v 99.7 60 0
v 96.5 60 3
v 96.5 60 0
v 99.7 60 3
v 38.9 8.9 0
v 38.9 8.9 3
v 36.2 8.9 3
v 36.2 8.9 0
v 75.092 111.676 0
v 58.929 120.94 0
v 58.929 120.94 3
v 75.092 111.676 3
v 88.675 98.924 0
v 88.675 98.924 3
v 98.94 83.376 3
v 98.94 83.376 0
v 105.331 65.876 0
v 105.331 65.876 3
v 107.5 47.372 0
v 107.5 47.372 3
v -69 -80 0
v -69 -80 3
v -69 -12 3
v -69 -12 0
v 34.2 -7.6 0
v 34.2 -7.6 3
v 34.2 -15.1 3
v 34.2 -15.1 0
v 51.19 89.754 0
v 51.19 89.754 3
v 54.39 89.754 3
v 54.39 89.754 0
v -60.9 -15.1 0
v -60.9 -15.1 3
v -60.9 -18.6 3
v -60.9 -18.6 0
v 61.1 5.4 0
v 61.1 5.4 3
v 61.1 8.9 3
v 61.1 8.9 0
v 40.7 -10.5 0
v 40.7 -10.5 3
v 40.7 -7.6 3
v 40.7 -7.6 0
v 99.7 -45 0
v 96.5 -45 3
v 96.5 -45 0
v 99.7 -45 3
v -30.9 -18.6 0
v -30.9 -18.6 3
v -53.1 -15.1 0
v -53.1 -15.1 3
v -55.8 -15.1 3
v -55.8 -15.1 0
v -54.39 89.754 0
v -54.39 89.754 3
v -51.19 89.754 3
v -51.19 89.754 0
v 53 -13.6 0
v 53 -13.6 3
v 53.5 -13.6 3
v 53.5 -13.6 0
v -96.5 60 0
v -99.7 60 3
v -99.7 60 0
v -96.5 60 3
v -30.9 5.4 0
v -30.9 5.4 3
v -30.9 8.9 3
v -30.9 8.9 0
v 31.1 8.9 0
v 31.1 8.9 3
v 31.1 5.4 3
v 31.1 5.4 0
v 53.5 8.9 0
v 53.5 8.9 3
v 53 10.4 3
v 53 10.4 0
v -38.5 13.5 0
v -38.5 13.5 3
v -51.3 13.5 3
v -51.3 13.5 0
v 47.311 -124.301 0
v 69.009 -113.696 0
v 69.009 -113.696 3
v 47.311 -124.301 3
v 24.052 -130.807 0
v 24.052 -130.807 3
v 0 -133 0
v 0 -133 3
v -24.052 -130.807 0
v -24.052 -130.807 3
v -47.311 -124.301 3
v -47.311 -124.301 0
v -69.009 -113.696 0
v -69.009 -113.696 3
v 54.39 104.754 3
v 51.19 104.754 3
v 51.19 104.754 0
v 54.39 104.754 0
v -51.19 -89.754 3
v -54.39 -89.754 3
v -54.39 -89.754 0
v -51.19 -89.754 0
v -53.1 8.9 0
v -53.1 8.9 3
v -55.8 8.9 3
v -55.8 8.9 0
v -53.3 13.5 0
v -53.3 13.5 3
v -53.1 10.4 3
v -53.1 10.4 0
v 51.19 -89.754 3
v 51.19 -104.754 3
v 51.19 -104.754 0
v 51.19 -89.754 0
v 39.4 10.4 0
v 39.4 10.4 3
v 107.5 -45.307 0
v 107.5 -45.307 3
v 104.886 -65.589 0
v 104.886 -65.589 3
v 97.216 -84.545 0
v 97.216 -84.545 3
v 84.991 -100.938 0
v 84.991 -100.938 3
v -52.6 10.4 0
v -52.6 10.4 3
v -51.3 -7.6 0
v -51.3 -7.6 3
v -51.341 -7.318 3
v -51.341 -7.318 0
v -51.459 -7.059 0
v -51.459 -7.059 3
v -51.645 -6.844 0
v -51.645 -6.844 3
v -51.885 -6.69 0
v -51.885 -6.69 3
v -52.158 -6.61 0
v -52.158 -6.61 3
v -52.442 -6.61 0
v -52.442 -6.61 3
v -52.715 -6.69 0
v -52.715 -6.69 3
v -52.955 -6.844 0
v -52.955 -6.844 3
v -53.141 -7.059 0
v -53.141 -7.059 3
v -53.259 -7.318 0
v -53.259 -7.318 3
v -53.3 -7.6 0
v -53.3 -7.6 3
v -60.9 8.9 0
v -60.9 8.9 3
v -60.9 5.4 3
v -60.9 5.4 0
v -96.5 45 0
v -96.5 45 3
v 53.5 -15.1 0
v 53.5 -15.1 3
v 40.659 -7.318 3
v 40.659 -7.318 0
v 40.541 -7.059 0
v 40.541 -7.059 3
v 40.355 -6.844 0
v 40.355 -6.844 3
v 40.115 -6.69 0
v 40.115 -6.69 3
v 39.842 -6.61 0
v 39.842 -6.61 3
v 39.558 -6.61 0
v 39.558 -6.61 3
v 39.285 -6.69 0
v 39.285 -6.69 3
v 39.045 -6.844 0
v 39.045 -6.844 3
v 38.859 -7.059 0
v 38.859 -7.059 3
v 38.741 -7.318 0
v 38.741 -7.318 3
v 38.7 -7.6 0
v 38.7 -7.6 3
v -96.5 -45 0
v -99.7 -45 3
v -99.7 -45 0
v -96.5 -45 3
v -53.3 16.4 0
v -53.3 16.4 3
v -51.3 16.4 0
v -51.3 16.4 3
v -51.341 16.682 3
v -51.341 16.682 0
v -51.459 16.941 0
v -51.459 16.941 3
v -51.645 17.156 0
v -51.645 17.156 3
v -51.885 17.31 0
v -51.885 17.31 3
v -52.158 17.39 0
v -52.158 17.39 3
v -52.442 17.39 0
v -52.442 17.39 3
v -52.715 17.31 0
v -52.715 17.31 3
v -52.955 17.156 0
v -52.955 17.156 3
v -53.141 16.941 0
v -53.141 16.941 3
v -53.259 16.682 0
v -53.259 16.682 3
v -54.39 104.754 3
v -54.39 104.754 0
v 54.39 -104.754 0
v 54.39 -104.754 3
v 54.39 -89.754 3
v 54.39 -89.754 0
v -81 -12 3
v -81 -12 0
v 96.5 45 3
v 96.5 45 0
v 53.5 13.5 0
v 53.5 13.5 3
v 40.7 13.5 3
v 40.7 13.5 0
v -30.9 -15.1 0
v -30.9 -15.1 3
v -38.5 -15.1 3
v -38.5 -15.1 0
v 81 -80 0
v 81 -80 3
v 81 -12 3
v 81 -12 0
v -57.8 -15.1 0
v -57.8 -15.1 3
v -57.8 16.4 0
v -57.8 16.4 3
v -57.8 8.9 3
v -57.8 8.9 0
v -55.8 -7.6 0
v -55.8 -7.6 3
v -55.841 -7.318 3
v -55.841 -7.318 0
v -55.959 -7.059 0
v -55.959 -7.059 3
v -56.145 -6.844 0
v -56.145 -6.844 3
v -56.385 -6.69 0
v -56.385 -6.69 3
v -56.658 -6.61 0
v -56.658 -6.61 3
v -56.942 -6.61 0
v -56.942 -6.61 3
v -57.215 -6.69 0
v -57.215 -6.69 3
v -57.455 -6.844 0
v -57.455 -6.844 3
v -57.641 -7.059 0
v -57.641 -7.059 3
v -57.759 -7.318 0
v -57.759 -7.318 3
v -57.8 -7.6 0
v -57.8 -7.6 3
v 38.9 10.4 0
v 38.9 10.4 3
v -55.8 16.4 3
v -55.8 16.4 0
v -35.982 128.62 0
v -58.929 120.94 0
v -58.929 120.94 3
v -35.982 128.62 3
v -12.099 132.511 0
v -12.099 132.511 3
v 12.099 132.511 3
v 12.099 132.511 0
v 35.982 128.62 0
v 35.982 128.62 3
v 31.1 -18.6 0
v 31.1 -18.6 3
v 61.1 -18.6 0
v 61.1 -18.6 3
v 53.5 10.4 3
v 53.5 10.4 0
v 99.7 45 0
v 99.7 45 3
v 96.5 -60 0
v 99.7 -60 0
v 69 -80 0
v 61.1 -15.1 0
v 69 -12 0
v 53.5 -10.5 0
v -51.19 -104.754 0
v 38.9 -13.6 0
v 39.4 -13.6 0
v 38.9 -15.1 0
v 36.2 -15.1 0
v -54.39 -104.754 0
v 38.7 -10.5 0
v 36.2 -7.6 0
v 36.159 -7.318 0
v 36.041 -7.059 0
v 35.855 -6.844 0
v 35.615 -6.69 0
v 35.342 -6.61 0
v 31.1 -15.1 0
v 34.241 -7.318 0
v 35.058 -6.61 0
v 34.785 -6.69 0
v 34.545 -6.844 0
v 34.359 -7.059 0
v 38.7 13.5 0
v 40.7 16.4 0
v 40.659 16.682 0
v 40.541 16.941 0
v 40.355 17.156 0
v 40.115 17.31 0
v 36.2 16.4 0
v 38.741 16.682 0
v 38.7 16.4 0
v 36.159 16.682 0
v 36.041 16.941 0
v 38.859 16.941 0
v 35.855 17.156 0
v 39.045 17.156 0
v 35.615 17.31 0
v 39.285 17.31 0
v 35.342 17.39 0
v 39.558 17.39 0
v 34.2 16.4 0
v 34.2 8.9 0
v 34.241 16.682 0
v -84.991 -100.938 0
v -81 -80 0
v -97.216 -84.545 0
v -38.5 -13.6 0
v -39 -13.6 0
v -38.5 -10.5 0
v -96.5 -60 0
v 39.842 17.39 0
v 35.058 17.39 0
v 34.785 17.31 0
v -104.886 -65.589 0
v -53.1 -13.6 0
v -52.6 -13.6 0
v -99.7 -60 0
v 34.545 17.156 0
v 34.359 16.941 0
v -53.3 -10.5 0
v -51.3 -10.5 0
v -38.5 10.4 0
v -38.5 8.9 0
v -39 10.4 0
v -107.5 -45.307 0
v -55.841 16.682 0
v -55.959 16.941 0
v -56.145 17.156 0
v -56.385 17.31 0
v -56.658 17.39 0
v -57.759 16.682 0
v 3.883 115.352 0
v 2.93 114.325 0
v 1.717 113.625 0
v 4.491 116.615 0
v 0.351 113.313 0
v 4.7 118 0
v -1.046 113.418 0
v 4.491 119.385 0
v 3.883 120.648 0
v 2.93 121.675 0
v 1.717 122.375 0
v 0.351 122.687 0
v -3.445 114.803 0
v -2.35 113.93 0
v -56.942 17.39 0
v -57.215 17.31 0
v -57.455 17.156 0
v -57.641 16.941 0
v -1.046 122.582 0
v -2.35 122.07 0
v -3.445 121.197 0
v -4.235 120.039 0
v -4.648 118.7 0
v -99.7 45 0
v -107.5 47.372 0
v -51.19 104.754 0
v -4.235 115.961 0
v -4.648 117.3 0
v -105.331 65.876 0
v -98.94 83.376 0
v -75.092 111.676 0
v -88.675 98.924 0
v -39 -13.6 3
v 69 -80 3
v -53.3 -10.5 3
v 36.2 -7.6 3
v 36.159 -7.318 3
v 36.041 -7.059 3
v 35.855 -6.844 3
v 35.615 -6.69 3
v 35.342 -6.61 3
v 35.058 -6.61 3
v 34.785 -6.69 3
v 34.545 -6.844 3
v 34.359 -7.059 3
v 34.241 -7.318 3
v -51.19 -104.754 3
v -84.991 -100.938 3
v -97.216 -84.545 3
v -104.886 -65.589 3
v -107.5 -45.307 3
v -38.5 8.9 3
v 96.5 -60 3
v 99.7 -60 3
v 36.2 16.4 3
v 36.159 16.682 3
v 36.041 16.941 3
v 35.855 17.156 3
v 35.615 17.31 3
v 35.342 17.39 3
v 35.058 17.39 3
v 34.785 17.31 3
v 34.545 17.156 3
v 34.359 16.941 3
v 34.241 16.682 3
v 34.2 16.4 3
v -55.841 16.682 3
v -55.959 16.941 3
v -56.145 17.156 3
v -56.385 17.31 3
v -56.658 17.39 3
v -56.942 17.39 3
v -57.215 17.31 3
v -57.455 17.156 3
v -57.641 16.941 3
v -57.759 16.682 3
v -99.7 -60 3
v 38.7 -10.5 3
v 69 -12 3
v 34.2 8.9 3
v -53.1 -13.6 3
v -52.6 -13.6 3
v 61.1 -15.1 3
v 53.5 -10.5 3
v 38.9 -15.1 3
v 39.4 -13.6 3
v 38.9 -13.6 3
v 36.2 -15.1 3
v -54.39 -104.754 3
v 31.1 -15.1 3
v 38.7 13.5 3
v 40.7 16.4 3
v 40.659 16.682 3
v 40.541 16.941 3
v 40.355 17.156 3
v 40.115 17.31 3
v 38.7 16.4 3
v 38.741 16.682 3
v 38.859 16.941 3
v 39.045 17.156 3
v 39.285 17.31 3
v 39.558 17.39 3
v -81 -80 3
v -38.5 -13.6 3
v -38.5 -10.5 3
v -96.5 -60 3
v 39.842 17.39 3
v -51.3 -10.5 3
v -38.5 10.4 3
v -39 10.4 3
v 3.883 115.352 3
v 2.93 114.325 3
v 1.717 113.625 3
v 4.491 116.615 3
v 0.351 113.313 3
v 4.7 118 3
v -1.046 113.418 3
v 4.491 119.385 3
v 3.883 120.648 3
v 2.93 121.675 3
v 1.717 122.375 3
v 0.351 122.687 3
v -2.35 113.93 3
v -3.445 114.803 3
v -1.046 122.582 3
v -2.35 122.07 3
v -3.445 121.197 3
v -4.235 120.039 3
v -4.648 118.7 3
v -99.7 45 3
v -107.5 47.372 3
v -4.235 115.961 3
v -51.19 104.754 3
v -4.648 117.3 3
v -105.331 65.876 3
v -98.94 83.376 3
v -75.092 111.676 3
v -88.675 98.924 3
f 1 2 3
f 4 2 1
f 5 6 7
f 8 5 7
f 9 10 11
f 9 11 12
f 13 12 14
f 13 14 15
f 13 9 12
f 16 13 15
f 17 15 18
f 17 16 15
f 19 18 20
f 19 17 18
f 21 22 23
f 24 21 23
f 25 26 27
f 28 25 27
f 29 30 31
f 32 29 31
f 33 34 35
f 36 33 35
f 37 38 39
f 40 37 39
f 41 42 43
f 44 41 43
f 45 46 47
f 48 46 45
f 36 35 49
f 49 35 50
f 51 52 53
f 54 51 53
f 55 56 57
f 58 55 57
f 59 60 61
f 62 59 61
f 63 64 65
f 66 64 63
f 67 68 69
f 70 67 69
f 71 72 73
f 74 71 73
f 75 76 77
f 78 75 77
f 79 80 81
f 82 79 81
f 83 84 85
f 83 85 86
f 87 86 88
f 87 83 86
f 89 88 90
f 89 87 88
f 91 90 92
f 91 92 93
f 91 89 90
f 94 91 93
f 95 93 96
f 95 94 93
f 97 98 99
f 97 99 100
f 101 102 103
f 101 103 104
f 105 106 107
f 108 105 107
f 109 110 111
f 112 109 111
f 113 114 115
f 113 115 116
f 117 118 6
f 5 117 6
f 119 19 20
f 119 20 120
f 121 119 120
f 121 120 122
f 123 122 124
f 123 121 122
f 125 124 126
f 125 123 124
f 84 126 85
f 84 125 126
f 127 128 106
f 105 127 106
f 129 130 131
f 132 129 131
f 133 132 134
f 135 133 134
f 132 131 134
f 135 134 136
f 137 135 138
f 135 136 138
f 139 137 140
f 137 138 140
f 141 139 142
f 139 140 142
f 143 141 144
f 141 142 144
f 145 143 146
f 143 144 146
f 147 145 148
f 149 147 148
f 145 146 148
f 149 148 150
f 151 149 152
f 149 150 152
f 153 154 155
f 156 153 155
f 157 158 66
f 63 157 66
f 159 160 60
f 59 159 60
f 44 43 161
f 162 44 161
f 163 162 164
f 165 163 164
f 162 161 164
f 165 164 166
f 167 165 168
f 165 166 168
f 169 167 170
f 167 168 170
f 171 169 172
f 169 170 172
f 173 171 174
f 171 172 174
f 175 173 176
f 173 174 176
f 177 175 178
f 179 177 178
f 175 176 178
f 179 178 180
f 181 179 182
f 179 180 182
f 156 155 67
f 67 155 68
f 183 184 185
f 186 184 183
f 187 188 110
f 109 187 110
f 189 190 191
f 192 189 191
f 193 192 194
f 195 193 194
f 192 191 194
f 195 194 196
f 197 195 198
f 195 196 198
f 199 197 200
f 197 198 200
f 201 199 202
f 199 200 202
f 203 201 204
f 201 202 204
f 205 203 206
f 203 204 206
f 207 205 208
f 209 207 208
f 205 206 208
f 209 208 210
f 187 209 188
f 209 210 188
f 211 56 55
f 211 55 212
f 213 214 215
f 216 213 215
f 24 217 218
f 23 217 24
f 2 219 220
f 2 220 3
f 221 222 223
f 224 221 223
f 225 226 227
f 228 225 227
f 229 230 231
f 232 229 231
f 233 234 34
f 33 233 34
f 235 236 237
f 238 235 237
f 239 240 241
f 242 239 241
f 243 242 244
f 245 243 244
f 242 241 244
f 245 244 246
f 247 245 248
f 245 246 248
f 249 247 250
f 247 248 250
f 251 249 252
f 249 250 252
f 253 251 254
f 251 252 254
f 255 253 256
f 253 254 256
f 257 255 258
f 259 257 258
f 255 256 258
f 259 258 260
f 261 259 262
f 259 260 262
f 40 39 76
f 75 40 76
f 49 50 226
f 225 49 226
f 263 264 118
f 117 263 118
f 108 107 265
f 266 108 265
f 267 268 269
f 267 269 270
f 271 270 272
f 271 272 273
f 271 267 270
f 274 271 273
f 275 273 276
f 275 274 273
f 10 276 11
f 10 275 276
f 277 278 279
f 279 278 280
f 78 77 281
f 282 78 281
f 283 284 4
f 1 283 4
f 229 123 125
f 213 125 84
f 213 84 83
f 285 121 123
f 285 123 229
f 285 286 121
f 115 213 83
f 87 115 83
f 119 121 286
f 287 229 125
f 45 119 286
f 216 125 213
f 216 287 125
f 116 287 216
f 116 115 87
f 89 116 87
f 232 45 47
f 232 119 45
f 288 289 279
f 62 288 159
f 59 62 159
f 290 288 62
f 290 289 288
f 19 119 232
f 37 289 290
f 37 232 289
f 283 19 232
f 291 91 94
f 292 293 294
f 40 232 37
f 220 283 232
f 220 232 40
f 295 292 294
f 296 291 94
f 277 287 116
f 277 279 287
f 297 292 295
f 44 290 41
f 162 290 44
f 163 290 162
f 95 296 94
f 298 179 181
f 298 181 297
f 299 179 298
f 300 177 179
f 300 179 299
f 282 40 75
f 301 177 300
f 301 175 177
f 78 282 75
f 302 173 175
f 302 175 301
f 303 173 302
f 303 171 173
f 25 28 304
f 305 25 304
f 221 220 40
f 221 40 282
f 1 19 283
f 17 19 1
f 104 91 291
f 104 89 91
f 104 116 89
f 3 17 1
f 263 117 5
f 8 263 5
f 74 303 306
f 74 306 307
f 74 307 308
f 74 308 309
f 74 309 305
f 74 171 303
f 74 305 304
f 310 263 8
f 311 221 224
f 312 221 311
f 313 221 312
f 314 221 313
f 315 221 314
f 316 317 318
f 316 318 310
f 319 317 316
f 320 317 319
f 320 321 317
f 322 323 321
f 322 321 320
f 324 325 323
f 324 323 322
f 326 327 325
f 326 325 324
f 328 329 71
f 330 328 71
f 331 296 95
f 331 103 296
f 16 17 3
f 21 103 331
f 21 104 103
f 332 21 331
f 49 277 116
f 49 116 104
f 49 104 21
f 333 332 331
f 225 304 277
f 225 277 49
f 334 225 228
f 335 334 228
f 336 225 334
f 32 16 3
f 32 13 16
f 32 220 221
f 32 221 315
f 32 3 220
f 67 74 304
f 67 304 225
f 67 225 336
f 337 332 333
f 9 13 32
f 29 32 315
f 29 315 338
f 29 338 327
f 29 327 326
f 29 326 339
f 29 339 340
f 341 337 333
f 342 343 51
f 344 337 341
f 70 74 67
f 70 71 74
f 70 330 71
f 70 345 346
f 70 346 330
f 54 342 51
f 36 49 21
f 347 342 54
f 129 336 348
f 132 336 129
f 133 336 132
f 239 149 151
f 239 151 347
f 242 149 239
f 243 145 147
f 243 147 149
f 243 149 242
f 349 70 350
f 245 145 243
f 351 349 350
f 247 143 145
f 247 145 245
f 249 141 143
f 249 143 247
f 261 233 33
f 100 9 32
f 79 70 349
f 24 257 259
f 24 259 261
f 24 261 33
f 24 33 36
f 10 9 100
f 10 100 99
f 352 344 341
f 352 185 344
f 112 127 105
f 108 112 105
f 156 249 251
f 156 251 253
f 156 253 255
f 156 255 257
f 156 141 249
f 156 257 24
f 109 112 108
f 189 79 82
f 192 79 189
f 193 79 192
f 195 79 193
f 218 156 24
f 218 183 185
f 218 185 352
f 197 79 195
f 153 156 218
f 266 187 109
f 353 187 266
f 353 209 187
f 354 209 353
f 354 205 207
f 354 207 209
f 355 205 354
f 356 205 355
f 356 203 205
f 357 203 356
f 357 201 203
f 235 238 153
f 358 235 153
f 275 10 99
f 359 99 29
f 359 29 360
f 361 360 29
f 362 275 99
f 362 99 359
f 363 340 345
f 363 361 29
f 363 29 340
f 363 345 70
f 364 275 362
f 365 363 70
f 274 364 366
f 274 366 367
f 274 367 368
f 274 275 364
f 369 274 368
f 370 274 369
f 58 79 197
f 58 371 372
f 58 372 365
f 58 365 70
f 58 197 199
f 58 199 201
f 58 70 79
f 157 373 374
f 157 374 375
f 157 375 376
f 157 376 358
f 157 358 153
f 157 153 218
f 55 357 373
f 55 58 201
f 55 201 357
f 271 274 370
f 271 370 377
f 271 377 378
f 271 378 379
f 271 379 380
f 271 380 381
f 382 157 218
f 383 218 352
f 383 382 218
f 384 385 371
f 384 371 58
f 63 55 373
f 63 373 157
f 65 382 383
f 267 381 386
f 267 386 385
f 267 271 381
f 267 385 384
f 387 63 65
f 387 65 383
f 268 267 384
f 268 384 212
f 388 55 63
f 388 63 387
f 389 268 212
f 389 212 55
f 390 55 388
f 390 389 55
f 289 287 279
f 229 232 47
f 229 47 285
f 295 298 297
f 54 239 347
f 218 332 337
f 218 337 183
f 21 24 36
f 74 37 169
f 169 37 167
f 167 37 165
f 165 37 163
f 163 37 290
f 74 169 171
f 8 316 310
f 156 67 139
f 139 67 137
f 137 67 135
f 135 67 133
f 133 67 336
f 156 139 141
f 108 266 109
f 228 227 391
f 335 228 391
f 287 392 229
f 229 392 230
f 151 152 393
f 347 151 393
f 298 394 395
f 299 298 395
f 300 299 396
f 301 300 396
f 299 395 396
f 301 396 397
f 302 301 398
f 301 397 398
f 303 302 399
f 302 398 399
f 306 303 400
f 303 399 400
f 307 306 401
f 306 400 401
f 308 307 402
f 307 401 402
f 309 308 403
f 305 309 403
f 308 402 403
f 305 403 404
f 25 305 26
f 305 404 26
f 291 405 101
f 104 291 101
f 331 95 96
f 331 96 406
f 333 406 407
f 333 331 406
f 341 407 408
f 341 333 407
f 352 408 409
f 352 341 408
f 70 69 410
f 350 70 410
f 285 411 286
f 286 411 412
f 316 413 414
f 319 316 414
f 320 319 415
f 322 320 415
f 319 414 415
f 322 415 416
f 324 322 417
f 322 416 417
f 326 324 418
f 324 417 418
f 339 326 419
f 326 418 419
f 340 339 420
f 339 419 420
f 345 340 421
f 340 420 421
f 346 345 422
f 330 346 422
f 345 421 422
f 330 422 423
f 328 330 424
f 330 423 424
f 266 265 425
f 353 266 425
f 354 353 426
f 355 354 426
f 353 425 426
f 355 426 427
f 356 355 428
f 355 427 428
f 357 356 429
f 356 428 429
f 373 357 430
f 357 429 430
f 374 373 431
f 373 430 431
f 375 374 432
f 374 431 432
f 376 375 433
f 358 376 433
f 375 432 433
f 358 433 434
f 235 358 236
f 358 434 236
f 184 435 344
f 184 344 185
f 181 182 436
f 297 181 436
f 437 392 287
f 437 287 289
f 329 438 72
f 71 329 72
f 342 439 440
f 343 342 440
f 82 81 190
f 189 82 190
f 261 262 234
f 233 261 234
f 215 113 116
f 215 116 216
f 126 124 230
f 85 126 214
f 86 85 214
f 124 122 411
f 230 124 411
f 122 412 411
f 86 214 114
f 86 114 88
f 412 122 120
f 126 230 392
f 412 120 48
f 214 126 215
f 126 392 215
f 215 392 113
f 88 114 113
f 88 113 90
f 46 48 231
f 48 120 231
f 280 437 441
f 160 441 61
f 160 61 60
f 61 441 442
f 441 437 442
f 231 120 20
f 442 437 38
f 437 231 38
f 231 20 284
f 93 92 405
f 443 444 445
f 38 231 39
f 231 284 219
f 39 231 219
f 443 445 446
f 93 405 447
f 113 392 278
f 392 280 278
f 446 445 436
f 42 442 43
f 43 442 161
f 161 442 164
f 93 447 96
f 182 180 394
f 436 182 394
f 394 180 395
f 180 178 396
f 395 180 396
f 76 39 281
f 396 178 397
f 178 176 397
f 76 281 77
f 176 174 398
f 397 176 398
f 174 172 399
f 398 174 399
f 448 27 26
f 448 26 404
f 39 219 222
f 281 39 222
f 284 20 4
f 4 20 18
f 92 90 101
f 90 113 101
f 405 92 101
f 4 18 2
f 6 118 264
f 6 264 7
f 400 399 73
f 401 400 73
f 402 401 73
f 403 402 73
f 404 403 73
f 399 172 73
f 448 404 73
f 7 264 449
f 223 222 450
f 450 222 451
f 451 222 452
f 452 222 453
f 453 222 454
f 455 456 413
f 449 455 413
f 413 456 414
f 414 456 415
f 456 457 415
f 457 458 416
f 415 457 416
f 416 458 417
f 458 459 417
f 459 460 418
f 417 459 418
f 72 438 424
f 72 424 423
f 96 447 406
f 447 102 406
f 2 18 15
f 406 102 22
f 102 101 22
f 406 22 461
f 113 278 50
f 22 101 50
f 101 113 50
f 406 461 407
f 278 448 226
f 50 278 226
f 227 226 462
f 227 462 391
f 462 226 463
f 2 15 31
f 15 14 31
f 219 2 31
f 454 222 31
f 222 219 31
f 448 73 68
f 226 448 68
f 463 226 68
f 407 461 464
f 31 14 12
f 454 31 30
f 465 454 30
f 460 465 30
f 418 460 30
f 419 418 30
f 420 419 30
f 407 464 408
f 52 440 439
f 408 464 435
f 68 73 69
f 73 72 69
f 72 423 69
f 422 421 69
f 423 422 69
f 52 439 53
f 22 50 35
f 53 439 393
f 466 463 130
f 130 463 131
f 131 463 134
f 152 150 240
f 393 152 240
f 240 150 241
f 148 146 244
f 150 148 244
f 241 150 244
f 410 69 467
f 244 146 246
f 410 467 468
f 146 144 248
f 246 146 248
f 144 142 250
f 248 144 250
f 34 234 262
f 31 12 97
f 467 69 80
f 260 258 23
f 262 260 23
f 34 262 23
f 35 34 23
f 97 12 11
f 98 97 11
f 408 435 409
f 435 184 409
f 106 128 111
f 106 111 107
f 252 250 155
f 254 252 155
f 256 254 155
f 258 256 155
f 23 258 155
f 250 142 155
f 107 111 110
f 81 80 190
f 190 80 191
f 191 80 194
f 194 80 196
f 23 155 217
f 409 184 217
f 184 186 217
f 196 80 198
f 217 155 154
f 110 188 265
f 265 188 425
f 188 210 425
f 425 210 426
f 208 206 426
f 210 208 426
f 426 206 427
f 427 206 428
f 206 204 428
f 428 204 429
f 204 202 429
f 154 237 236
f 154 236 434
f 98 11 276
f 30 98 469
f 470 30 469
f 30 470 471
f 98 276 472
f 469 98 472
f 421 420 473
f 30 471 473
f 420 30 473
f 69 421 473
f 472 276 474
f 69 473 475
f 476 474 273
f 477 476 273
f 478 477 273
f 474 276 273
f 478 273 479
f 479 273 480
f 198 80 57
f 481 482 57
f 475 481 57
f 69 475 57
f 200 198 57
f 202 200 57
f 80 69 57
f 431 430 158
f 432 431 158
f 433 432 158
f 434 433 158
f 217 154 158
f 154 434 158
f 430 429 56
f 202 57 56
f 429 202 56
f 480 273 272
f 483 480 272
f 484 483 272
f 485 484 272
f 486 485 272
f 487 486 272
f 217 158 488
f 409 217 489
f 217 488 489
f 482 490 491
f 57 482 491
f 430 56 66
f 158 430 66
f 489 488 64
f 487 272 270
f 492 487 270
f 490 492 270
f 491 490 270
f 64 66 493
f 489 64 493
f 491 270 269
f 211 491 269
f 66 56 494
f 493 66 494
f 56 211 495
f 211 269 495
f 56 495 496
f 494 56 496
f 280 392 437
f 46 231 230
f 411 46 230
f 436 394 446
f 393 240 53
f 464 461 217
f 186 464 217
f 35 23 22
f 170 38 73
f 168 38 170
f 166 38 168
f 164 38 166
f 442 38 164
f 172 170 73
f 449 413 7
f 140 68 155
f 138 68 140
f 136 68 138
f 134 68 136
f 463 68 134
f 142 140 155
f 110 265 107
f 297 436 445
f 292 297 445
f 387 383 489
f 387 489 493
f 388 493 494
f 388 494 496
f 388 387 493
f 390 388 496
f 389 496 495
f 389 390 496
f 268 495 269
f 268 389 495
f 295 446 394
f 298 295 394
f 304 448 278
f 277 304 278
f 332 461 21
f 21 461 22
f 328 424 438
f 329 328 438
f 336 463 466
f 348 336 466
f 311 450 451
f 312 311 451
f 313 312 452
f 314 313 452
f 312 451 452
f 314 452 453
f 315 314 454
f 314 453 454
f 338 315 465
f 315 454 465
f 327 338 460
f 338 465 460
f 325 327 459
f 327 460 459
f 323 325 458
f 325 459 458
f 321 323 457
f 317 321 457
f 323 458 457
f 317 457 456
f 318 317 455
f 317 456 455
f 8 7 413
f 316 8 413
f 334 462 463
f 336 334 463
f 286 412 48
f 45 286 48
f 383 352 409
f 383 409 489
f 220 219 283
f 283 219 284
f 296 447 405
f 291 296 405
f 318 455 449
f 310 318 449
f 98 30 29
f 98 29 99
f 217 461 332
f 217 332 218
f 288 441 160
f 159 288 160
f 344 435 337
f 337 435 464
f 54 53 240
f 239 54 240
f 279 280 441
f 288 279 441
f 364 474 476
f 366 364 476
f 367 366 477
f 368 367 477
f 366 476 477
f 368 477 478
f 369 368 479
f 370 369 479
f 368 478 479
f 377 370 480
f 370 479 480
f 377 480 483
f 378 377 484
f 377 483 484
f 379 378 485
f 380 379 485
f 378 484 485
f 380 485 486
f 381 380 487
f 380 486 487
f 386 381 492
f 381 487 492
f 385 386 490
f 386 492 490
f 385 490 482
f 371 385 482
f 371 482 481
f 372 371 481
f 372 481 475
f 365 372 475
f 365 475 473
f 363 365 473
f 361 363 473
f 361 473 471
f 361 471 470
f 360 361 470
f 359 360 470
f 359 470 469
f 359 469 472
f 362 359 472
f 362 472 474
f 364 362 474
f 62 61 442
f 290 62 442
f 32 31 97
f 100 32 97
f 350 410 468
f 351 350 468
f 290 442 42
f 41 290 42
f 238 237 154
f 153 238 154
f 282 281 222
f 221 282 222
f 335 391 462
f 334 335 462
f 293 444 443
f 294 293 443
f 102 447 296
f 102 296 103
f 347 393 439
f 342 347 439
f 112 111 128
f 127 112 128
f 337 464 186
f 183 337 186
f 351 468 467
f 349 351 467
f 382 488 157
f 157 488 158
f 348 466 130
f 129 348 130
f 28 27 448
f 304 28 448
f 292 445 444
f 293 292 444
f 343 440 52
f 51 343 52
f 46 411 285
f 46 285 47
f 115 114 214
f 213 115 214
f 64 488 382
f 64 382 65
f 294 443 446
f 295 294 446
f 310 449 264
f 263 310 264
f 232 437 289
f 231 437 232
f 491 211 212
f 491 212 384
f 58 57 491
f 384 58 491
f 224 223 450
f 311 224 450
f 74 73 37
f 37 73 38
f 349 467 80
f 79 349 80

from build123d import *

# Parameters (mm, degrees)
BOSS_EXTRUDE1_DEPTH          = 3
MOUNTING_SLOTS_REACH         = 173.039
SKETCH2_W                    = 3.2
SKETCH2_H                    = 15
CASTER_AND_WHEEL_SLOTS_REACH = 173.039
SKETCH3_R                    = 4.7
SKETCH3_W                    = 12
SKETCH3_H                    = 68


with BuildPart() as part:
    # Sketch1 → Boss-Extrude1 (new body)
    with BuildSketch(Plane.XY):
        with BuildLine():
            Line((-107.5, -45.307284183), (-107.5, 47.371965948))
            ThreePointArc((-107.5, 47.371965948), (-94.261836832, 91.449819149), (-58.928571429, 120.939927031))
            ThreePointArc((-58.928571429, 120.939927031), (0, 133), (58.928571429, 120.939927031))
            ThreePointArc((58.928571429, 120.939927031), (94.261836832, 91.449819149), (107.5, 47.371965948))
            Line((107.5, 47.371965948), (107.5, -45.307284183))
            ThreePointArc((107.5, -45.307284183), (97.216406667, -84.545309636), (69.009433962, -113.695637666))
            ThreePointArc((69.009433962, -113.695637666), (0, -133), (-69.009433962, -113.695637666))
            ThreePointArc((-69.009433962, -113.695637666), (-97.216406667, -84.545309636), (-107.5, -45.307284183))
        make_face()
    extrude(amount=BOSS_EXTRUDE1_DEPTH)

    # Sketch2 → mounting slots (cut, up to next)
    with BuildSketch(Plane.XY.offset(3), mode=Mode.PRIVATE) as mounting_slots_sk1:
        with Locations((98.1, -52.5)):
            Rectangle(SKETCH2_W, SKETCH2_H)
    mounting_slots_tool1 = extrude(mounting_slots_sk1.sketch, amount=-MOUNTING_SLOTS_REACH, mode=Mode.PRIVATE) & part.part
    # Sketch2 → mounting slots (cut, up to next)
    with BuildSketch(Plane.XY.offset(3), mode=Mode.PRIVATE) as mounting_slots_sk2:
        with Locations((98.1, 52.5)):
            Rectangle(SKETCH2_W, SKETCH2_H)
    mounting_slots_tool2 = extrude(mounting_slots_sk2.sketch, amount=-MOUNTING_SLOTS_REACH, mode=Mode.PRIVATE) & part.part
    # Sketch2 → mounting slots (cut, up to next)
    with BuildSketch(Plane.XY.offset(3), mode=Mode.PRIVATE) as mounting_slots_sk3:
        with Locations((-98.1, 52.5)):
            Rectangle(SKETCH2_W, SKETCH2_H)
    mounting_slots_tool3 = extrude(mounting_slots_sk3.sketch, amount=-MOUNTING_SLOTS_REACH, mode=Mode.PRIVATE) & part.part
    # Sketch2 → mounting slots (cut, up to next)
    with BuildSketch(Plane.XY.offset(3), mode=Mode.PRIVATE) as mounting_slots_sk4:
        with Locations((-98.1, -52.5)):
            Rectangle(SKETCH2_W, SKETCH2_H)
    mounting_slots_tool4 = extrude(mounting_slots_sk4.sketch, amount=-MOUNTING_SLOTS_REACH, mode=Mode.PRIVATE) & part.part
    # Sketch2 → mounting slots (cut, up to next)
    with BuildSketch(Plane.XY.offset(3), mode=Mode.PRIVATE) as mounting_slots_sk5:
        with Locations((52.79, 97.254160418)):
            Rectangle(SKETCH2_W, SKETCH2_H)
    mounting_slots_tool5 = extrude(mounting_slots_sk5.sketch, amount=-MOUNTING_SLOTS_REACH, mode=Mode.PRIVATE) & part.part
    # Sketch2 → mounting slots (cut, up to next)
    with BuildSketch(Plane.XY.offset(3), mode=Mode.PRIVATE) as mounting_slots_sk6:
        with Locations((52.79, -97.254160418)):
            Rectangle(SKETCH2_W, SKETCH2_H)
    mounting_slots_tool6 = extrude(mounting_slots_sk6.sketch, amount=-MOUNTING_SLOTS_REACH, mode=Mode.PRIVATE) & part.part
    # Sketch2 → mounting slots (cut, up to next)
    with BuildSketch(Plane.XY.offset(3), mode=Mode.PRIVATE) as mounting_slots_sk7:
        with Locations((-52.79, 97.254160418)):
            Rectangle(SKETCH2_W, SKETCH2_H)
    mounting_slots_tool7 = extrude(mounting_slots_sk7.sketch, amount=-MOUNTING_SLOTS_REACH, mode=Mode.PRIVATE) & part.part
    # Sketch2 → mounting slots (cut, up to next)
    with BuildSketch(Plane.XY.offset(3), mode=Mode.PRIVATE) as mounting_slots_sk8:
        with Locations((-52.79, -97.254160418)):
            Rectangle(SKETCH2_W, SKETCH2_H)
    mounting_slots_tool8 = extrude(mounting_slots_sk8.sketch, amount=-MOUNTING_SLOTS_REACH, mode=Mode.PRIVATE) & part.part
    # Sketch2 → mounting slots (cut, up to next)
    with BuildSketch(Plane.XY.offset(3), mode=Mode.PRIVATE) as mounting_slots_sk9:
        with BuildLine():
            Line((31.1, -18.6), (61.1, -18.6))
            Line((61.1, -18.6), (61.1, -15.1))
            Line((61.1, -15.1), (53.5, -15.1))
            Line((53.5, -15.1), (53, -13.6))
            Line((53, -13.6), (53.5, -13.6))
            Line((53.5, -13.6), (53.5, -10.5))
            Line((53.5, -10.5), (40.7, -10.5))
            Line((40.7, -10.5), (40.7, -7.6))
            ThreePointArc((40.7, -7.6), (39.7, -6.6), (38.7, -7.6))
            Line((38.7, -7.6), (38.7, -10.5))
            Line((38.7, -10.5), (38.9, -13.6))
            Line((38.9, -13.6), (39.4, -13.6))
            Line((39.4, -13.6), (38.9, -15.1))
            Line((38.9, -15.1), (36.2, -15.1))
            Line((36.2, -15.1), (36.2, -7.6))
            ThreePointArc((36.2, -7.6), (35.2, -6.6), (34.2, -7.6))
            Line((34.2, -7.6), (34.2, -15.1))
            Line((34.2, -15.1), (31.1, -15.1))
            Line((31.1, -15.1), (31.1, -18.6))
        make_face()
    mounting_slots_tool9 = extrude(mounting_slots_sk9.sketch, amount=-MOUNTING_SLOTS_REACH, mode=Mode.PRIVATE) & part.part
    # Sketch2 → mounting slots (cut, up to next)
    with BuildSketch(Plane.XY.offset(3), mode=Mode.PRIVATE) as mounting_slots_sk10:
        with BuildLine():
            Line((31.1, 5.4), (61.1, 5.4))
            Line((61.1, 5.4), (61.1, 8.9))
            Line((61.1, 8.9), (53.5, 8.9))
            Line((53.5, 8.9), (53, 10.4))
            Line((53, 10.4), (53.5, 10.4))
            Line((53.5, 10.4), (53.5, 13.5))
            Line((53.5, 13.5), (40.7, 13.5))
            Line((40.7, 13.5), (40.7, 16.4))
            ThreePointArc((40.7, 16.4), (39.7, 17.4), (38.7, 16.4))
            Line((38.7, 16.4), (38.7, 13.5))
            Line((38.7, 13.5), (38.9, 10.4))
            Line((38.9, 10.4), (39.4, 10.4))
            Line((39.4, 10.4), (38.9, 8.9))
            Line((38.9, 8.9), (36.2, 8.9))
            Line((36.2, 8.9), (36.2, 16.4))
            ThreePointArc((36.2, 16.4), (35.2, 17.4), (34.2, 16.4))
            Line((34.2, 16.4), (34.2, 8.9))
            Line((34.2, 8.9), (31.1, 8.9))
            Line((31.1, 8.9), (31.1, 5.4))
        make_face()
    mounting_slots_tool10 = extrude(mounting_slots_sk10.sketch, amount=-MOUNTING_SLOTS_REACH, mode=Mode.PRIVATE) & part.part
    # Sketch2 → mounting slots (cut, up to next)
    with BuildSketch(Plane.XY.offset(3), mode=Mode.PRIVATE) as mounting_slots_sk11:
        with BuildLine():
            Line((-60.9, -18.6), (-30.9, -18.6))
            Line((-30.9, -18.6), (-30.9, -15.1))
            Line((-30.9, -15.1), (-38.5, -15.1))
            Line((-38.5, -15.1), (-39, -13.6))
            Line((-39, -13.6), (-38.5, -13.6))
            Line((-38.5, -13.6), (-38.5, -10.5))
            Line((-38.5, -10.5), (-51.3, -10.5))
            Line((-51.3, -10.5), (-51.3, -7.6))
            ThreePointArc((-51.3, -7.6), (-52.3, -6.6), (-53.3, -7.6))
            Line((-53.3, -7.6), (-53.3, -10.5))
            Line((-53.3, -10.5), (-53.1, -13.6))
            Line((-53.1, -13.6), (-52.6, -13.6))
            Line((-52.6, -13.6), (-53.1, -15.1))
            Line((-53.1, -15.1), (-55.8, -15.1))
            Line((-55.8, -15.1), (-55.8, -7.6))
            ThreePointArc((-55.8, -7.6), (-56.8, -6.6), (-57.8, -7.6))
            Line((-57.8, -7.6), (-57.8, -15.1))
            Line((-57.8, -15.1), (-60.9, -15.1))
            Line((-60.9, -15.1), (-60.9, -18.6))
        make_face()
    mounting_slots_tool11 = extrude(mounting_slots_sk11.sketch, amount=-MOUNTING_SLOTS_REACH, mode=Mode.PRIVATE) & part.part
    # Sketch2 → mounting slots (cut, up to next)
    with BuildSketch(Plane.XY.offset(3), mode=Mode.PRIVATE) as mounting_slots_sk12:
        with BuildLine():
            Line((-60.9, 5.4), (-30.9, 5.4))
            Line((-30.9, 5.4), (-30.9, 8.9))
            Line((-30.9, 8.9), (-38.5, 8.9))
            Line((-38.5, 8.9), (-39, 10.4))
            Line((-39, 10.4), (-38.5, 10.4))
            Line((-38.5, 10.4), (-38.5, 13.5))
            Line((-38.5, 13.5), (-51.3, 13.5))
            Line((-51.3, 13.5), (-51.3, 16.4))
            ThreePointArc((-51.3, 16.4), (-52.3, 17.4), (-53.3, 16.4))
            Line((-53.3, 16.4), (-53.3, 13.5))
            Line((-53.3, 13.5), (-53.1, 10.4))
            Line((-53.1, 10.4), (-52.6, 10.4))
            Line((-52.6, 10.4), (-53.1, 8.9))
            Line((-53.1, 8.9), (-55.8, 8.9))
            Line((-55.8, 8.9), (-55.8, 16.4))
            ThreePointArc((-55.8, 16.4), (-56.8, 17.4), (-57.8, 16.4))
            Line((-57.8, 16.4), (-57.8, 8.9))
            Line((-57.8, 8.9), (-60.9, 8.9))
            Line((-60.9, 8.9), (-60.9, 5.4))
        make_face()
    mounting_slots_tool12 = extrude(mounting_slots_sk12.sketch, amount=-MOUNTING_SLOTS_REACH, mode=Mode.PRIVATE) & part.part
    add(mounting_slots_tool1.solids().sort_by_distance((98.1, -52.5, 3))[0], mode=Mode.SUBTRACT)
    add(mounting_slots_tool2.solids().sort_by_distance((98.1, 52.5, 3))[0], mode=Mode.SUBTRACT)
    add(mounting_slots_tool3.solids().sort_by_distance((-98.1, 52.5, 3))[0], mode=Mode.SUBTRACT)
    add(mounting_slots_tool4.solids().sort_by_distance((-98.1, -52.5, 3))[0], mode=Mode.SUBTRACT)
    add(mounting_slots_tool5.solids().sort_by_distance((52.79, 97.25416, 3))[0], mode=Mode.SUBTRACT)
    add(mounting_slots_tool6.solids().sort_by_distance((52.79, -97.25416, 3))[0], mode=Mode.SUBTRACT)
    add(mounting_slots_tool7.solids().sort_by_distance((-52.79, 97.25416, 3))[0], mode=Mode.SUBTRACT)
    add(mounting_slots_tool8.solids().sort_by_distance((-52.79, -97.25416, 3))[0], mode=Mode.SUBTRACT)
    add(mounting_slots_tool9.solids().sort_by_distance((44.9582, -14.653776, 3))[0], mode=Mode.SUBTRACT)
    add(mounting_slots_tool10.solids().sort_by_distance((44.9582, 9.346224, 3))[0], mode=Mode.SUBTRACT)
    add(mounting_slots_tool11.solids().sort_by_distance((-47.0418, -14.653776, 3))[0], mode=Mode.SUBTRACT)
    add(mounting_slots_tool12.solids().sort_by_distance((-47.0418, 9.346224, 3))[0], mode=Mode.SUBTRACT)

    # Sketch3 → caster and wheel slots (cut, up to next)
    with BuildSketch(Plane.XY.offset(3), mode=Mode.PRIVATE) as caster_and_wheel_slots_sk1:
        with Locations((0, 118)):
            Circle(SKETCH3_R)
    caster_and_wheel_slots_tool1 = extrude(caster_and_wheel_slots_sk1.sketch, amount=-CASTER_AND_WHEEL_SLOTS_REACH, mode=Mode.PRIVATE) & part.part
    # Sketch3 → caster and wheel slots (cut, up to next)
    with BuildSketch(Plane.XY.offset(3), mode=Mode.PRIVATE) as caster_and_wheel_slots_sk2:
        with Locations((75, -46)):
            Rectangle(SKETCH3_W, SKETCH3_H)
    caster_and_wheel_slots_tool2 = extrude(caster_and_wheel_slots_sk2.sketch, amount=-CASTER_AND_WHEEL_SLOTS_REACH, mode=Mode.PRIVATE) & part.part
    # Sketch3 → caster and wheel slots (cut, up to next)
    with BuildSketch(Plane.XY.offset(3), mode=Mode.PRIVATE) as caster_and_wheel_slots_sk3:
        with Locations((-75, -46)):
            Rectangle(SKETCH3_W, SKETCH3_H)
    caster_and_wheel_slots_tool3 = extrude(caster_and_wheel_slots_sk3.sketch, amount=-CASTER_AND_WHEEL_SLOTS_REACH, mode=Mode.PRIVATE) & part.part
    add(caster_and_wheel_slots_tool1.solids().sort_by_distance((0, 118, 3))[0], mode=Mode.SUBTRACT)
    add(caster_and_wheel_slots_tool2.solids().sort_by_distance((75, -46, 3))[0], mode=Mode.SUBTRACT)
    add(caster_and_wheel_slots_tool3.solids().sort_by_distance((-75, -46, 3))[0], mode=Mode.SUBTRACT)


solid = part.part
